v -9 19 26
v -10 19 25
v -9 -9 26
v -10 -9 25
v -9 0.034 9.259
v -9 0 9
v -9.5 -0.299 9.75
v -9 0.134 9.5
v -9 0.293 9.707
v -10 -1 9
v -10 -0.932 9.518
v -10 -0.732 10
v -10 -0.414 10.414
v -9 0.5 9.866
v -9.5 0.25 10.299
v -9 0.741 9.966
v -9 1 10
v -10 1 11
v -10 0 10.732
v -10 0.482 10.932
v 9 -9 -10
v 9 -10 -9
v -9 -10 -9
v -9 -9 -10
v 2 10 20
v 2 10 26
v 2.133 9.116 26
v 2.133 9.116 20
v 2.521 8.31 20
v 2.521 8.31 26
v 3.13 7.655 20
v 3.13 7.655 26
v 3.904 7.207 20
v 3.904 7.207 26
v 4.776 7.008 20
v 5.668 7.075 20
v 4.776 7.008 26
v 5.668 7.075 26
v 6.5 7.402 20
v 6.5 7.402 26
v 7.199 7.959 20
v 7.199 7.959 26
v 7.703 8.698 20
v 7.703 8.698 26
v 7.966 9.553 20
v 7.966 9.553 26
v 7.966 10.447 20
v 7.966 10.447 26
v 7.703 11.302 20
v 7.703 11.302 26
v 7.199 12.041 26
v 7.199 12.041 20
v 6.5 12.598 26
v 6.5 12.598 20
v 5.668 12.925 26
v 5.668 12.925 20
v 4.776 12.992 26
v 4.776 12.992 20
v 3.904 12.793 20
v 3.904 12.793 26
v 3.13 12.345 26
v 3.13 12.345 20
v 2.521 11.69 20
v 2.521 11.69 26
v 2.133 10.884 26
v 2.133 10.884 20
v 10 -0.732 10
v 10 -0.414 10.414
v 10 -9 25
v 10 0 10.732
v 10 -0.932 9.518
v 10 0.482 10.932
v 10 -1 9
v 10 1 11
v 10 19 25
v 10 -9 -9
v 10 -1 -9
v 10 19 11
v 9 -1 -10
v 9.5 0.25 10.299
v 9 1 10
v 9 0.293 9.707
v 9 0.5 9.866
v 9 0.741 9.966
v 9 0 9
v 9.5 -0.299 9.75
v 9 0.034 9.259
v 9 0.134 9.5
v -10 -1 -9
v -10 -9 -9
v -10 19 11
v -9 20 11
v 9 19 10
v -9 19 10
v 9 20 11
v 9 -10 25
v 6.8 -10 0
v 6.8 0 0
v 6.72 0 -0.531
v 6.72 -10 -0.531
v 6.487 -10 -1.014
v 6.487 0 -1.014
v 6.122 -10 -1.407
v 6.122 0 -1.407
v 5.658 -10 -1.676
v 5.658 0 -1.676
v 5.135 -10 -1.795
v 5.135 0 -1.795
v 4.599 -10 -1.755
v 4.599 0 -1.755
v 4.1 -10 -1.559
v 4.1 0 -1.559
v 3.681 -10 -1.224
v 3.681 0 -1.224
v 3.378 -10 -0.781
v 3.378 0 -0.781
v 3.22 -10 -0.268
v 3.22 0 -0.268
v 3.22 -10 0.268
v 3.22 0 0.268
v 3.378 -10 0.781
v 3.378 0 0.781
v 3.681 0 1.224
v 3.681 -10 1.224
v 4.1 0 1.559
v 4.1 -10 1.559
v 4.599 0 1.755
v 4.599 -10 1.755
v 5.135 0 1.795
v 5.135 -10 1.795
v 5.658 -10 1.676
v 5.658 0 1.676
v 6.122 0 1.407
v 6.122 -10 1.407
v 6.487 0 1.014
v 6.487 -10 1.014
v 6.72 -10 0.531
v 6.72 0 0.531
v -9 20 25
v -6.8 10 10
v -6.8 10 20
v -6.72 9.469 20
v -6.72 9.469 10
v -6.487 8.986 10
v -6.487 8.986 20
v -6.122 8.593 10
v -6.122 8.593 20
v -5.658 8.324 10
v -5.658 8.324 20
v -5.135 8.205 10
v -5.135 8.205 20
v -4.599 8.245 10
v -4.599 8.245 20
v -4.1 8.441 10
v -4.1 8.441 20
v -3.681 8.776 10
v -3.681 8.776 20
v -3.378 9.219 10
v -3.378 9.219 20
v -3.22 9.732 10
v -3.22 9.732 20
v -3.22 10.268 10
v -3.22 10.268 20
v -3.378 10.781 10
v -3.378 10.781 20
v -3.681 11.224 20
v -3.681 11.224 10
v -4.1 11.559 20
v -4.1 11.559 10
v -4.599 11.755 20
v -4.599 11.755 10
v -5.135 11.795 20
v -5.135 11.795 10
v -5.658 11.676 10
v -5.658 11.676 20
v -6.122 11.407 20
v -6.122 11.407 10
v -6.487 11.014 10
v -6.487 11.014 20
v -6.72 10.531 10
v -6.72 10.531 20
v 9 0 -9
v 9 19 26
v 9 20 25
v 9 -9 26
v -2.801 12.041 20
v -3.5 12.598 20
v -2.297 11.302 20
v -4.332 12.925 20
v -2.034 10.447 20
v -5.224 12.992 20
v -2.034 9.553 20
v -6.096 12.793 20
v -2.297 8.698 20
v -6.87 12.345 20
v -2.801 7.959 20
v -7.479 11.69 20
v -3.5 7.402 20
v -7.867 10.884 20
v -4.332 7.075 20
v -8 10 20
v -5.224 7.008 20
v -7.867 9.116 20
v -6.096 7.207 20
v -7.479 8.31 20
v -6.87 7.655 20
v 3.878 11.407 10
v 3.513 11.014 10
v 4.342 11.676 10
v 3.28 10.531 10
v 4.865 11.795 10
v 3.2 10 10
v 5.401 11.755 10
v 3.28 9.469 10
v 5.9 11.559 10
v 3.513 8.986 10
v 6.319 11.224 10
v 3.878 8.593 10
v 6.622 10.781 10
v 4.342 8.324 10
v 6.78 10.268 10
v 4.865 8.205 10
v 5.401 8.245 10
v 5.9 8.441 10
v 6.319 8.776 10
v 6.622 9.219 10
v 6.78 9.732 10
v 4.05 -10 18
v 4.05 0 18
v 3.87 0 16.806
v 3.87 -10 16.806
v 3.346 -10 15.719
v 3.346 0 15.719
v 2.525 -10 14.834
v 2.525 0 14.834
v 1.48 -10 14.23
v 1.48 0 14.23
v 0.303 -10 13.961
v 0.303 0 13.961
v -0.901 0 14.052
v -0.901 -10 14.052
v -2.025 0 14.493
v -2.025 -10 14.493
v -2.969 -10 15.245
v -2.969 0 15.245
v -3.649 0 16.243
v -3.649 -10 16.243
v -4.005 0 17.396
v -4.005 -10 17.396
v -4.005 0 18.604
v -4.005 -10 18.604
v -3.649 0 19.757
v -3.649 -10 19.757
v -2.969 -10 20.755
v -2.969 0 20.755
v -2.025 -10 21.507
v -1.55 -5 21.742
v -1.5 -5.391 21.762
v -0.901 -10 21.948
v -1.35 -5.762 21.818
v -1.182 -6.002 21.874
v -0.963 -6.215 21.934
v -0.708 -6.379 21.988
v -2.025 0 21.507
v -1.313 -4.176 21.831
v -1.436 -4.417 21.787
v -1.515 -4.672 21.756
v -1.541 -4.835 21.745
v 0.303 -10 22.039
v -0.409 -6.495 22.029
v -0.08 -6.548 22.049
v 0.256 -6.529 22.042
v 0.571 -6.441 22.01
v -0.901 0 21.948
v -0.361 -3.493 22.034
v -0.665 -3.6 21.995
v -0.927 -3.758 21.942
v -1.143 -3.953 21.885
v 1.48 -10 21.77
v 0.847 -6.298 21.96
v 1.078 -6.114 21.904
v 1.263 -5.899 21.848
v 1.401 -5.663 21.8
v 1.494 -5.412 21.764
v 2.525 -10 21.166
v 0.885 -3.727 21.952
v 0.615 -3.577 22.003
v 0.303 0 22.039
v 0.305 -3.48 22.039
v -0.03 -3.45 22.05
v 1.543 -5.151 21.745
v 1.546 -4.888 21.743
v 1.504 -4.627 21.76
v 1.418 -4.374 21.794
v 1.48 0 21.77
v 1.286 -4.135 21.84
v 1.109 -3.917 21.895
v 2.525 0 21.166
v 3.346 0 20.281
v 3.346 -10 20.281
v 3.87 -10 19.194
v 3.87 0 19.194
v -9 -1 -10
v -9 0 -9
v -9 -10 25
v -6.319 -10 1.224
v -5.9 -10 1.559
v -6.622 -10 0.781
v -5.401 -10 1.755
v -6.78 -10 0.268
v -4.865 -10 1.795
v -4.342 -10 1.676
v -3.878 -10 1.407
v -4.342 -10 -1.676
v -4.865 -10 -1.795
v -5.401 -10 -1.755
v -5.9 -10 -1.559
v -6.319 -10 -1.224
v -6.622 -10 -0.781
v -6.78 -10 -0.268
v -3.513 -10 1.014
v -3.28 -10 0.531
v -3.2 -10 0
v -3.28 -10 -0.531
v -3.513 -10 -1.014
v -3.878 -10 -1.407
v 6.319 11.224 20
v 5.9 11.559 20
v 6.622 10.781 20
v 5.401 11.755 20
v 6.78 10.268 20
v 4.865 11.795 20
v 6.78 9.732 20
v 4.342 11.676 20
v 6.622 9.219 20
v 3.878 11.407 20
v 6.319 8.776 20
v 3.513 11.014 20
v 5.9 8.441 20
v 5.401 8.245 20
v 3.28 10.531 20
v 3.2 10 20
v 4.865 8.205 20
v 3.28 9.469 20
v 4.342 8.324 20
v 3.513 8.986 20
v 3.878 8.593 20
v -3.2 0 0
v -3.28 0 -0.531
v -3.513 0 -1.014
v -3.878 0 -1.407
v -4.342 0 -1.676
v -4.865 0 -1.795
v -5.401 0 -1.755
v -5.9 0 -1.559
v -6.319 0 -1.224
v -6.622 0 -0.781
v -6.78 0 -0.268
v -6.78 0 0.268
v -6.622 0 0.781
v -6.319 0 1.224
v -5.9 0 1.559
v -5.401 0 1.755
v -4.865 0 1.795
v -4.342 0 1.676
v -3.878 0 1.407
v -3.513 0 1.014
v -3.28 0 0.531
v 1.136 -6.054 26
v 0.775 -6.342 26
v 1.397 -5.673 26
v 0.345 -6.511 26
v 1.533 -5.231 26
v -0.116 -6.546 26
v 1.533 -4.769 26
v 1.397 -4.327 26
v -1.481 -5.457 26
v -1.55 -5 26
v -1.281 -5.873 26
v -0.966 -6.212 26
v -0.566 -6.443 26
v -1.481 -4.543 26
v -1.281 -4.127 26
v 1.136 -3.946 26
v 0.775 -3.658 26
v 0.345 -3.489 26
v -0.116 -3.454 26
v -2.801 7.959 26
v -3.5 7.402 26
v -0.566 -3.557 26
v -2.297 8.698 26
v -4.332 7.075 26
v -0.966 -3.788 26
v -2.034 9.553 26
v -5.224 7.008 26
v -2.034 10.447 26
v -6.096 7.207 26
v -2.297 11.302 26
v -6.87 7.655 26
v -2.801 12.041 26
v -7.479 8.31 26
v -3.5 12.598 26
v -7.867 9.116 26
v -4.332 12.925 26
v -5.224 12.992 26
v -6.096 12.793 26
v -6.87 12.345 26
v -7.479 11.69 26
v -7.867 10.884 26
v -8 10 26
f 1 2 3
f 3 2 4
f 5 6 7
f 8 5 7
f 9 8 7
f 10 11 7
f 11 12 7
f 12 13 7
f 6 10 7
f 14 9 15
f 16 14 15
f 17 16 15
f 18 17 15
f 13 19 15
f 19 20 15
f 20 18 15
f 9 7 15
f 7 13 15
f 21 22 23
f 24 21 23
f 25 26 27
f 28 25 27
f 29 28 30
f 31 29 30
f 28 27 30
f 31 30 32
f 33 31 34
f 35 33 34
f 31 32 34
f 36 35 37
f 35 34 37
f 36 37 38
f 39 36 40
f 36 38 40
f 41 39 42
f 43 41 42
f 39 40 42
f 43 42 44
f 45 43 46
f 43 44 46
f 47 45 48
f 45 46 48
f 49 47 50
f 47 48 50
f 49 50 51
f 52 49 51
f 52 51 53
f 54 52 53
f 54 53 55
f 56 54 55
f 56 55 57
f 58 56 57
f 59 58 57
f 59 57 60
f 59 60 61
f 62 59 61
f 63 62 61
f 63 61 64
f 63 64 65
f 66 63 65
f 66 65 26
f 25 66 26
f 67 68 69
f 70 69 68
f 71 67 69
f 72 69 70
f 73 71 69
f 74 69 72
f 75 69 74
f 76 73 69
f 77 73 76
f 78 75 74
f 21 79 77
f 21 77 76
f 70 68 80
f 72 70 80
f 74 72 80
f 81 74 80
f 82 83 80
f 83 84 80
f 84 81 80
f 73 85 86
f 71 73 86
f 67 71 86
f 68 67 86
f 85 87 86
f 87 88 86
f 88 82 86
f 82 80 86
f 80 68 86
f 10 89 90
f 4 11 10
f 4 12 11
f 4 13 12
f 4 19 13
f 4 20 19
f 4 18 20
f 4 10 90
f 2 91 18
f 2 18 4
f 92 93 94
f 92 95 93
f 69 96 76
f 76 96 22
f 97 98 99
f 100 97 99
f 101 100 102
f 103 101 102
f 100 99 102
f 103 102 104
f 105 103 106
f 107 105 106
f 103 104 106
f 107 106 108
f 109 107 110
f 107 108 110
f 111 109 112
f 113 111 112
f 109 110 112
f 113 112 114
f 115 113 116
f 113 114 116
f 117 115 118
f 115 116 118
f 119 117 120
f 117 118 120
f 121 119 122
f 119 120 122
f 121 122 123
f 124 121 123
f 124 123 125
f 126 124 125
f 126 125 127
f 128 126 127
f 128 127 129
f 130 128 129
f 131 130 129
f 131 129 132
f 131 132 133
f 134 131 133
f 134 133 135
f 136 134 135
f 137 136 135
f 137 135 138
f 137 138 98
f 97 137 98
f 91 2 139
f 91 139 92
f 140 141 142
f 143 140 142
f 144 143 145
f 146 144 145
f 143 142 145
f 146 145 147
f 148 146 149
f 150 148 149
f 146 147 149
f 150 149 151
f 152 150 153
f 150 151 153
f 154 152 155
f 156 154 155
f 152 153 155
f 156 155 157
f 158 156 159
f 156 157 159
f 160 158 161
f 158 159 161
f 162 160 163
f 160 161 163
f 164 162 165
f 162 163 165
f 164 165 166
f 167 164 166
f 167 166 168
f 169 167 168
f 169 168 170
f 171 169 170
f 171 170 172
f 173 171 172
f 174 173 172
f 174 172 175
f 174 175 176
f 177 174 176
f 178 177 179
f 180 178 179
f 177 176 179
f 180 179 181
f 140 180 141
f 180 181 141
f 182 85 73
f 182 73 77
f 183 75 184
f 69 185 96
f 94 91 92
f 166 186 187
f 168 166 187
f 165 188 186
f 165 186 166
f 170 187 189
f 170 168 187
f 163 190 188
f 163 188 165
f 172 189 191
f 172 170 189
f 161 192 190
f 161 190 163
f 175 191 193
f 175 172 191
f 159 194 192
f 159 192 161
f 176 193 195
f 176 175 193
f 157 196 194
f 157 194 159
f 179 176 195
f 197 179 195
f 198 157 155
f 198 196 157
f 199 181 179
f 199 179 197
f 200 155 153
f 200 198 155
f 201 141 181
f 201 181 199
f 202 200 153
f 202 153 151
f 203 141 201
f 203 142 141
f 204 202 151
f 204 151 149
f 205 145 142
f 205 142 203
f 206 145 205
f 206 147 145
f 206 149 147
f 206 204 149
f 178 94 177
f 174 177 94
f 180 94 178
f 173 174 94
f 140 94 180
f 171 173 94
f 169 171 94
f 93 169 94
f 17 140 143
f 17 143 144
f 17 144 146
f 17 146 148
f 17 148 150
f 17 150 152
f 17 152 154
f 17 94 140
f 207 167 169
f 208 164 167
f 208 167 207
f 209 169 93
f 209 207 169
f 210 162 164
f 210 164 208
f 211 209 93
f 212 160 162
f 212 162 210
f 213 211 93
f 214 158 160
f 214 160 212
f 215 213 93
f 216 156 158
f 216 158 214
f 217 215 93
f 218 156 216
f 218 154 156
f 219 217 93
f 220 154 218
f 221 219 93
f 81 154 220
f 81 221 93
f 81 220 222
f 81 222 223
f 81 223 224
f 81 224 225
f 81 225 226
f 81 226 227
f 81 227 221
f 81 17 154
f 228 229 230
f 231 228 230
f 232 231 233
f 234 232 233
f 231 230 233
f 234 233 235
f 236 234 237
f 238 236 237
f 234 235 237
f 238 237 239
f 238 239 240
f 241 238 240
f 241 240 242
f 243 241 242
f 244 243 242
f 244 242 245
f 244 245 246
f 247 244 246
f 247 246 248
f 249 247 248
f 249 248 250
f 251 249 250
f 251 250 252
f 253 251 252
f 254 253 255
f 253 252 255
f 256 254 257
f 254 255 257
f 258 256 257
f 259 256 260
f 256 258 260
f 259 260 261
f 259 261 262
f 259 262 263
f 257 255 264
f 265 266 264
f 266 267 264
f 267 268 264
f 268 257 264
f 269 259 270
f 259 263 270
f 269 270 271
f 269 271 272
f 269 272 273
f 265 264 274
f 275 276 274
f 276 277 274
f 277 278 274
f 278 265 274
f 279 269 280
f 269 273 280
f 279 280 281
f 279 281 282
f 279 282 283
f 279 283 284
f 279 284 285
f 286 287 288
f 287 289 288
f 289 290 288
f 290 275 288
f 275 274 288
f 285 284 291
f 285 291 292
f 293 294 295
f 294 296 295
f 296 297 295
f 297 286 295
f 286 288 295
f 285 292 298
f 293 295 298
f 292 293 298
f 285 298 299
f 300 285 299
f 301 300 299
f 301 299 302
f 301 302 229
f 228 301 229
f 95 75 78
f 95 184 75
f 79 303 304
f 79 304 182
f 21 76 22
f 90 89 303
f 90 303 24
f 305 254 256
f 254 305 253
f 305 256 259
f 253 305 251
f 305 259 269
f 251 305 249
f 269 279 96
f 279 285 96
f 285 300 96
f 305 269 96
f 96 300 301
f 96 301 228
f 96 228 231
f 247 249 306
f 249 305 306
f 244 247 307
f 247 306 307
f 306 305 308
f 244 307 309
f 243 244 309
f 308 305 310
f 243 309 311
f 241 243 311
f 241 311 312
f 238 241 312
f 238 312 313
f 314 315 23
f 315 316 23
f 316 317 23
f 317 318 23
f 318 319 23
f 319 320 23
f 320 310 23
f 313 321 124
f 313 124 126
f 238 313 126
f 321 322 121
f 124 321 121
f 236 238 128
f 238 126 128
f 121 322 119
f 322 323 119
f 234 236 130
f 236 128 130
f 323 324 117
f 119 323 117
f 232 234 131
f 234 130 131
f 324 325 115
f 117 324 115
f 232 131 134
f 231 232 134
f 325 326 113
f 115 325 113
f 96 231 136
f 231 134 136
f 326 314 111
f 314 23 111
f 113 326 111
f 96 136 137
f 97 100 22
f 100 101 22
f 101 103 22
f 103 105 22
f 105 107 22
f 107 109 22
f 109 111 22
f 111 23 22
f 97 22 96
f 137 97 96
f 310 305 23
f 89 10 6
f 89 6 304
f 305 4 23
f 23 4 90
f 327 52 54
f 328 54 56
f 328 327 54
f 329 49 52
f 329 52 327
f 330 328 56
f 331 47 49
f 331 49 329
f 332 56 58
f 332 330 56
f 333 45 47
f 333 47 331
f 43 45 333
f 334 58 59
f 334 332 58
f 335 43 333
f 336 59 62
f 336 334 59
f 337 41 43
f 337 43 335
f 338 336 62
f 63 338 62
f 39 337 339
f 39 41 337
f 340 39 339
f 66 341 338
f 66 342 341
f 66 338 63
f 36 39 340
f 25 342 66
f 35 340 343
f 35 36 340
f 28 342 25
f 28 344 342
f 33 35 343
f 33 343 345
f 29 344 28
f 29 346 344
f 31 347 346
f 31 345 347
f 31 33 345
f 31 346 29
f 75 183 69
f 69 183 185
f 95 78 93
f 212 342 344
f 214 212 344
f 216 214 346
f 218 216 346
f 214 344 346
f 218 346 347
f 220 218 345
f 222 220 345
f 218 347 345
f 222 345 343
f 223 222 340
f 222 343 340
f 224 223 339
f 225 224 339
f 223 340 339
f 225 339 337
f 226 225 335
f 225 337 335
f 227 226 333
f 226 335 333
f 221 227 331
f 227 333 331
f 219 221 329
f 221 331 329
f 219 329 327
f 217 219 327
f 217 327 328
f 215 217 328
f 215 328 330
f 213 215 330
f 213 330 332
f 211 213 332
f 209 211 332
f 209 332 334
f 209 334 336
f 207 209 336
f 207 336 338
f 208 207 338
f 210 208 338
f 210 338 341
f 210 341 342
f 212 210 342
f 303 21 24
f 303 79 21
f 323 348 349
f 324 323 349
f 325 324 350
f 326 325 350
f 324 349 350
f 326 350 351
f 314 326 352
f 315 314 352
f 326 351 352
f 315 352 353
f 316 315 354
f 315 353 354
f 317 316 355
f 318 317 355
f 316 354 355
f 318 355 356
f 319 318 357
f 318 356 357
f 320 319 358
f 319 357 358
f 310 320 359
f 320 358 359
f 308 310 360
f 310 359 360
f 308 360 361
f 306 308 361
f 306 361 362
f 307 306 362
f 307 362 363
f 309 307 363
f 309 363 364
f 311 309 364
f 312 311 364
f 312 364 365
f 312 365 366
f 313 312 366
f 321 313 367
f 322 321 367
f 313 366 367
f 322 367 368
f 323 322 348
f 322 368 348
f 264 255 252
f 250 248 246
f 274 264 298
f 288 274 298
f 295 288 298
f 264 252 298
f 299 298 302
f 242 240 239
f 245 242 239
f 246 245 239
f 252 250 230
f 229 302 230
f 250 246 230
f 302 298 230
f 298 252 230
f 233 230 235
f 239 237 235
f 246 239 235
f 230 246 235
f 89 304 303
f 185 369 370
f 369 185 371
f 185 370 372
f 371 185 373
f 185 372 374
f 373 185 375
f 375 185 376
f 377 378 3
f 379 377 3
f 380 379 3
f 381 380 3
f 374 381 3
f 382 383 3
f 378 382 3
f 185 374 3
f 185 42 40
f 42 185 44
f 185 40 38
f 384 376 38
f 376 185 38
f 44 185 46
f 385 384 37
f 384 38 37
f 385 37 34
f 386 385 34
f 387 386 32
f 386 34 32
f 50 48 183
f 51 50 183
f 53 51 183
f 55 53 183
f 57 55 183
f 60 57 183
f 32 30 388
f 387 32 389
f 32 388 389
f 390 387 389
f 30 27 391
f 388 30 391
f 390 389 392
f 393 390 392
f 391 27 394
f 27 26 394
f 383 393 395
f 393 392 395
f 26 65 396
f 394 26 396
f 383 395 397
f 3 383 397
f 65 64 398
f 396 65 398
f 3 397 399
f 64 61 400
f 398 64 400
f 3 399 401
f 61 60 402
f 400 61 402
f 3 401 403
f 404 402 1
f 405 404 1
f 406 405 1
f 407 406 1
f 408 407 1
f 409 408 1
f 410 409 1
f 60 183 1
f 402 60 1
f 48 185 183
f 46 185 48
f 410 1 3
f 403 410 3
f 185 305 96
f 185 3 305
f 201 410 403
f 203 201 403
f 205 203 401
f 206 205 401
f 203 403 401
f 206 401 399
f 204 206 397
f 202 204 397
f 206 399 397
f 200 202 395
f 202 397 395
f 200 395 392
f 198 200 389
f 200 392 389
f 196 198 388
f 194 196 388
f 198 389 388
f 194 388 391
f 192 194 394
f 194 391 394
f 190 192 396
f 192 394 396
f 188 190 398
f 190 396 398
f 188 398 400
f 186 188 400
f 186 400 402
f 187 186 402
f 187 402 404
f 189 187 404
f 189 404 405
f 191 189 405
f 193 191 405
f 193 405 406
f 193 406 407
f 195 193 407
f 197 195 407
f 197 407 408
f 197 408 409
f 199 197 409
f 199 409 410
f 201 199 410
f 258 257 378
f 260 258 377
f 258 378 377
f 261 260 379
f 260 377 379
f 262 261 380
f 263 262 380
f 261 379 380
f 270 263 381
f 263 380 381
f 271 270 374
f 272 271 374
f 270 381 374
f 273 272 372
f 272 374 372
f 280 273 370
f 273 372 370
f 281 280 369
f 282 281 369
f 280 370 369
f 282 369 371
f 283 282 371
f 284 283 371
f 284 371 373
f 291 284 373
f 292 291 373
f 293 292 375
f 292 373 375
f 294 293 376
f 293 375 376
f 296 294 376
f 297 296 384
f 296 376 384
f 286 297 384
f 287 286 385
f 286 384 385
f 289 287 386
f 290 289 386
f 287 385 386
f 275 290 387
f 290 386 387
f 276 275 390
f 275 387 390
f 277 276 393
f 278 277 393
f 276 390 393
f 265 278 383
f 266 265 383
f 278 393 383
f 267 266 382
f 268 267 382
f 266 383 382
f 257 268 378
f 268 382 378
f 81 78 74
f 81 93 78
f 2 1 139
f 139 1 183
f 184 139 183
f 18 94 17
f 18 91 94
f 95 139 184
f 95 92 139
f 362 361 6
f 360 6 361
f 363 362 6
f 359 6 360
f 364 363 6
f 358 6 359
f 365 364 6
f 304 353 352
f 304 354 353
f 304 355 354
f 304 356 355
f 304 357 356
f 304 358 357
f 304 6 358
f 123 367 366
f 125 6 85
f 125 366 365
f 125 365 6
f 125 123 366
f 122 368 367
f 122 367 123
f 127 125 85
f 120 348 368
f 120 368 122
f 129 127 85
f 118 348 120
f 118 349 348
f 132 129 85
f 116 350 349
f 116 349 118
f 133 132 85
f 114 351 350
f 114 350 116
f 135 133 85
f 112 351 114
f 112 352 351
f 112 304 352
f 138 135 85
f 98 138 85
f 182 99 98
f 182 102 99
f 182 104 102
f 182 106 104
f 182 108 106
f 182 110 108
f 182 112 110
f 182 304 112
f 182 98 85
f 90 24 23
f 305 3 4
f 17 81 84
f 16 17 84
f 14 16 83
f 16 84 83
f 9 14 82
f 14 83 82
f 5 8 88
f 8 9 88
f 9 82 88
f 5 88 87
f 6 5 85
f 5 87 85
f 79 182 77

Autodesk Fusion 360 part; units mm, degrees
sketch "Sketch1" plane through (0, 0, 0) normal (0, 1, 0) x (1, 0, 0)
  line L0 (10, 10) -> (-10, 10)
  line L1 (-10, 10) -> (-10, -10)
  line L2 (-10, -10) -> (10, -10)
  line L3 (10, -10) -> (10, 10)
  line L4 (10, 10) -> (-10, -10) construction
  line L5 (-10, 10) -> (10, -10) construction
  circle A0 centre (-5, 0) radius 1.8
  circle A1 centre (5, 0) radius 1.8
  line L6 (-10, -10) -> (10, -10)
  line L7 (10, -10) -> (10, -26)
  line L8 (10, -26) -> (-10, -26)
  line L9 (-10, -26) -> (-10, -10)
  line L10 (10, -10) -> (-10, -26) construction
  line L11 (-10, -10) -> (10, -26) construction
  circle A2 centre (0, -18) radius 4.05
  dimension "d52" = 20
  dimension "d53" = 20
  dimension "d55" = 10
  dimension "d56" = 3.6
  dimension "d57" = 3.6
  dimension "d58" = 20
  dimension "d59" = 16
  dimension "d60" = 8.1
extrude "Extrude1" add sketch "Sketch1" against normal blind 10
extrude "Extrude2" add sketch "Sketch1" along normal blind 20 contours L2 L6 L7 L8 L9 | A2
sketch "Sketch2" plane through (0, 0, 26) normal (0, 0, 1) x (-1, 0, 0)
  line L0 (10, -20) -> (-10, -20)
  line L1 (-10, -20) -> (-10, 0)
  line L2 (-10, 0) -> (10, 0)
  line L3 (10, 0) -> (10, -20)
  line L4 (-10, 0) -> (10, -20) construction
  line L5 (10, 0) -> (-10, -20) construction
  circle A0 centre (5, -10) radius 1.8
  circle A1 centre (-5, -10) radius 1.8
  line L6 (10, -20) -> (10, 10)
  line L7 (10, 10) -> (-10, 10)
  line L8 (-10, 10) -> (-10, -20)
  line L9 (-10, -20) -> (10, -20)
  line L10 (10, 0) -> (-10, 10) construction
  line L11 (-10, 0) -> (10, 10) construction
  circle A2 centre (0, 5) radius 1.55
  circle A3 centre (-5, -10) radius 3
  circle A4 centre (5, -10) radius 3
  dimension "d65" = 20
  dimension "d66" = 20
  dimension "d68" = 10
  dimension "d69" = 3.6
  dimension "d70" = 3.6
  dimension "d82" = 3.1
  dimension "d89" = 6
  dimension "d90" = 6
extrude "Extrude6" cut sketch "Sketch2" against normal blind 16 contours A0 | A1
extrude "Extrude7" cut sketch "Sketch2" against normal blind 4.5 contours A2
fillet "Fillet2" radius 1 1 edges at (0, 0, 10)
extrude "Extrude8" cut sketch "Sketch2" against normal blind 6 contours A3 | A4
chamfer "Chamfer4" distance 1 angle 45 19 edges at (10, 20, 18) (10, 10.5, 10) (10, 0, -0.5) (10, 0.2929, 9.7071) (10, 5, 26) (0, 20, 26) (-10, 5, 26) (0, -10, 26) (10, -10, 8) (-10, 0, -0.5) (-10, 0.2929, 9.7071) (-10, 10.5, 10) (-10, 20, 18) (0, 20, 10) (0, 0, -10) (10, -5, -10) (-10, -5, -10) (0, -10, -10) (-10, -10, 8)
